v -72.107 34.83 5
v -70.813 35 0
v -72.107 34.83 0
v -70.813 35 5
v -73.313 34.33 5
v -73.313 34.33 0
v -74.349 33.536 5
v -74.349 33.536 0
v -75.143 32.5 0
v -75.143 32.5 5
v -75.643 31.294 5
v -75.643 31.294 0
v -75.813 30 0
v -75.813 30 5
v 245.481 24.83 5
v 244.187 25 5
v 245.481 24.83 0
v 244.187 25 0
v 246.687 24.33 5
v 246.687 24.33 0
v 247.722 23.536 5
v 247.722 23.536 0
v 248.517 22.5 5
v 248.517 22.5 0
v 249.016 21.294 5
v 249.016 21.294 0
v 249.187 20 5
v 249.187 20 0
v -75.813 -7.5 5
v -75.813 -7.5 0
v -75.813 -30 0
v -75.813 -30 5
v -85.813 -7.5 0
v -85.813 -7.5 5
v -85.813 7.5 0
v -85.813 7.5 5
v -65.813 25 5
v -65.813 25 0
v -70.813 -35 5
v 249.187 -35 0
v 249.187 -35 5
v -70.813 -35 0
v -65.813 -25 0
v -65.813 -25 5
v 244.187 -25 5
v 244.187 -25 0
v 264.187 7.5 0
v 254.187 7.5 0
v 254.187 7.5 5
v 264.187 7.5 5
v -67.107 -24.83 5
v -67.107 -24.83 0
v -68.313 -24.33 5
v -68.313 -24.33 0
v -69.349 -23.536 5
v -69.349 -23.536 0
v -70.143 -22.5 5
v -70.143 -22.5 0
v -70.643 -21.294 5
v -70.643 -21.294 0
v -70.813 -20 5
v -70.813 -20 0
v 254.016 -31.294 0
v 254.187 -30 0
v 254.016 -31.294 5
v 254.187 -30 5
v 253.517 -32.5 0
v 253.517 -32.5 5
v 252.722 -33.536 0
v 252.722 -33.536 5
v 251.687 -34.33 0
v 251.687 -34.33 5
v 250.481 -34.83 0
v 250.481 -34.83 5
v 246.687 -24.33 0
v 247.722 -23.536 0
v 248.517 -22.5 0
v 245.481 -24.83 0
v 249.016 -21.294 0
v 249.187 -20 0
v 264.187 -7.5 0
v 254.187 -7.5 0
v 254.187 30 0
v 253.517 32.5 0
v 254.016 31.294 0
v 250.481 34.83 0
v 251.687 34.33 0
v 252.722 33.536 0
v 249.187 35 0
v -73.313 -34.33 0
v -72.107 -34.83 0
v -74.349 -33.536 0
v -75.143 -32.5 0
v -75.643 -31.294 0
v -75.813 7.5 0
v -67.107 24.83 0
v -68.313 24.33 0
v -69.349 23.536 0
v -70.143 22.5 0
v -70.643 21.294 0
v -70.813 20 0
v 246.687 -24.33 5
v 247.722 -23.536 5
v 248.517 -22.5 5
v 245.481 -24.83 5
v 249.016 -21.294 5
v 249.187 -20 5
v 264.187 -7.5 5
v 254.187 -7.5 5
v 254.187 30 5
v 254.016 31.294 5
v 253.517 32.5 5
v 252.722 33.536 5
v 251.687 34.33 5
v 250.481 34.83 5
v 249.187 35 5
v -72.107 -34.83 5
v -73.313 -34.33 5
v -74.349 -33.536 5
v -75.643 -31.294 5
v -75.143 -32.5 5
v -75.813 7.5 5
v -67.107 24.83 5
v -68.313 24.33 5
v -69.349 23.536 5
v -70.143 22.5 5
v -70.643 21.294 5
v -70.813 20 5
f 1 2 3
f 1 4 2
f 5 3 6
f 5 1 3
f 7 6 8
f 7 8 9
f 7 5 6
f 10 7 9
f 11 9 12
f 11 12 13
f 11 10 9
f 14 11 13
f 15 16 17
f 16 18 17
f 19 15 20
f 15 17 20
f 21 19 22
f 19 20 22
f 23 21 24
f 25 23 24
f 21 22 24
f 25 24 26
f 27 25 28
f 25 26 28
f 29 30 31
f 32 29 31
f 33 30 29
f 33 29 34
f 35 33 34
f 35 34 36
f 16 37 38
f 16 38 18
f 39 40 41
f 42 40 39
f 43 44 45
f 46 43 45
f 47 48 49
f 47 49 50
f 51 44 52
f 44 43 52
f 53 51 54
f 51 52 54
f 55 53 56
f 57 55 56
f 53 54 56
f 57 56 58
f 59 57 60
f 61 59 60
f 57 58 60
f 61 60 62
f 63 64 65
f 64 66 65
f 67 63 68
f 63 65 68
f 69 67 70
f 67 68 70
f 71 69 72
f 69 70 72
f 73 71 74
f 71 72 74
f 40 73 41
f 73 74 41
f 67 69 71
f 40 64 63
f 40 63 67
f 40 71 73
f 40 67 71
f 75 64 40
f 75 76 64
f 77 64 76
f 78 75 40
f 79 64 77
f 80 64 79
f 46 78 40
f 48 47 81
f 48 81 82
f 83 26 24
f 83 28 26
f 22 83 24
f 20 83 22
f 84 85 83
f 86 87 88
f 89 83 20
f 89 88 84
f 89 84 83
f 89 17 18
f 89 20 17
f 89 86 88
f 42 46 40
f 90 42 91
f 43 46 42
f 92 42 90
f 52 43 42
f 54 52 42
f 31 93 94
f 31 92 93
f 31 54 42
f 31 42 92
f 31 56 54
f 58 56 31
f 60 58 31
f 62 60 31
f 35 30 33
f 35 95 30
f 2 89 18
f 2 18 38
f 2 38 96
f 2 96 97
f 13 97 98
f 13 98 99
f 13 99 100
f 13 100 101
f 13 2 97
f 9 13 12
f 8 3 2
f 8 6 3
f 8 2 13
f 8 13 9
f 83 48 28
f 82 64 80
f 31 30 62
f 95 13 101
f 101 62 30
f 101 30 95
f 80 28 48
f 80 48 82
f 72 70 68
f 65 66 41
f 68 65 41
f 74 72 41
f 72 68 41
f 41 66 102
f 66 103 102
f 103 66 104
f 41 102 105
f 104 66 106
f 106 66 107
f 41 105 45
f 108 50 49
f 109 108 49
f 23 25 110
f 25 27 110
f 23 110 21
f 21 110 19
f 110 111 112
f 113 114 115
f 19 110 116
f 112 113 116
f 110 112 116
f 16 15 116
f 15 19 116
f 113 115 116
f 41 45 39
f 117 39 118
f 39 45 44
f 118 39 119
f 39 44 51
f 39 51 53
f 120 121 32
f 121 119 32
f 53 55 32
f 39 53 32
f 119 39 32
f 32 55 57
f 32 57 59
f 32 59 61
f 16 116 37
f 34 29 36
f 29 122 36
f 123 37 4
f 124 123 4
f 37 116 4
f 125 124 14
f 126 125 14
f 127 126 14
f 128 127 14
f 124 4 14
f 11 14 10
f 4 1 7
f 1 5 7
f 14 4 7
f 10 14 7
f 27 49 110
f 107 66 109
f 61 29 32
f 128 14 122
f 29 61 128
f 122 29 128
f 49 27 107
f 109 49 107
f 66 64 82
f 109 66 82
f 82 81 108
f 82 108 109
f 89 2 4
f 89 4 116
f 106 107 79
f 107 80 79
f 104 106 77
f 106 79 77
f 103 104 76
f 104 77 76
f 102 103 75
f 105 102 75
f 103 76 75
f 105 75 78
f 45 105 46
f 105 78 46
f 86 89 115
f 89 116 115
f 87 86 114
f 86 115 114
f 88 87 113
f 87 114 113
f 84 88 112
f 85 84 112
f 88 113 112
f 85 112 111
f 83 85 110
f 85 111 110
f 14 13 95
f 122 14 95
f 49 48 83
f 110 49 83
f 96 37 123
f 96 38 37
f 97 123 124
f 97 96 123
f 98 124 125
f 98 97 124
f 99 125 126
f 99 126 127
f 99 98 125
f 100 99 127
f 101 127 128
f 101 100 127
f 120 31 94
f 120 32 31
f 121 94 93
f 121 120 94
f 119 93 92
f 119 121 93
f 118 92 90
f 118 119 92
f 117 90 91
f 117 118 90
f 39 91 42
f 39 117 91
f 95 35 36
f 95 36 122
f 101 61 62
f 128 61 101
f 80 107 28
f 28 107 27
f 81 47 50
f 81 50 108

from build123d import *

# Parameters (mm, degrees)
BOSS_EXTRUDE1_DEPTH     = 5
ESQUISSE1_W             = 320
ESQUISSE1_H             = 50
ENL_V_MAT_EXTRU_1_DEPTH = 10
CONG_1_R                = 5


with BuildPart() as part:
    # Sketch1 → Boss-Extrude1 (new body)
    with BuildSketch(Plane.XY):
        Polygon((-75.813253012, 35), (254.186746988, 35), (254.186746988, 17.5), (254.186746988, 7.5), (264.186746988, 7.5), (264.186746988, -7.5), (254.186746988, -7.5), (254.186746988, -17.5), (254.186746988, -35), (-75.813253012, -35), (-75.813253012, -17.5), (-75.813253012, -7.5), (-85.813253012, -7.5), (-85.813253012, 7.5), (-75.813253012, 7.5), (-75.813253012, 17.5), align=None)
    extrude(amount=BOSS_EXTRUDE1_DEPTH)

    # Esquisse1 → Enlèv. mat.-Extru.1 (cut)
    with BuildSketch(Plane.XY.offset(5)):
        with Locations((89.186746988, 0)):
            Rectangle(ESQUISSE1_W, ESQUISSE1_H)
    extrude(amount=-ENL_V_MAT_EXTRU_1_DEPTH, mode=Mode.SUBTRACT)

    # Congé1
    cong_1_edges = [part.edges().sort_by_distance(p)[0] for p in [
        (-75.813253012, 35, 2.5),
        (254.186746988, 35, 2.5),
        (254.186746988, -35, 2.5),
        (-75.813253012, -35, 2.5),
        (-70.813253012, -25, 2.5),
        (-70.813253012, 25, 2.5),
        (249.186746988, 25, 2.5),
        (249.186746988, -25, 2.5),
    ]]
    fillet(cong_1_edges, radius=CONG_1_R)


solid = part.part
